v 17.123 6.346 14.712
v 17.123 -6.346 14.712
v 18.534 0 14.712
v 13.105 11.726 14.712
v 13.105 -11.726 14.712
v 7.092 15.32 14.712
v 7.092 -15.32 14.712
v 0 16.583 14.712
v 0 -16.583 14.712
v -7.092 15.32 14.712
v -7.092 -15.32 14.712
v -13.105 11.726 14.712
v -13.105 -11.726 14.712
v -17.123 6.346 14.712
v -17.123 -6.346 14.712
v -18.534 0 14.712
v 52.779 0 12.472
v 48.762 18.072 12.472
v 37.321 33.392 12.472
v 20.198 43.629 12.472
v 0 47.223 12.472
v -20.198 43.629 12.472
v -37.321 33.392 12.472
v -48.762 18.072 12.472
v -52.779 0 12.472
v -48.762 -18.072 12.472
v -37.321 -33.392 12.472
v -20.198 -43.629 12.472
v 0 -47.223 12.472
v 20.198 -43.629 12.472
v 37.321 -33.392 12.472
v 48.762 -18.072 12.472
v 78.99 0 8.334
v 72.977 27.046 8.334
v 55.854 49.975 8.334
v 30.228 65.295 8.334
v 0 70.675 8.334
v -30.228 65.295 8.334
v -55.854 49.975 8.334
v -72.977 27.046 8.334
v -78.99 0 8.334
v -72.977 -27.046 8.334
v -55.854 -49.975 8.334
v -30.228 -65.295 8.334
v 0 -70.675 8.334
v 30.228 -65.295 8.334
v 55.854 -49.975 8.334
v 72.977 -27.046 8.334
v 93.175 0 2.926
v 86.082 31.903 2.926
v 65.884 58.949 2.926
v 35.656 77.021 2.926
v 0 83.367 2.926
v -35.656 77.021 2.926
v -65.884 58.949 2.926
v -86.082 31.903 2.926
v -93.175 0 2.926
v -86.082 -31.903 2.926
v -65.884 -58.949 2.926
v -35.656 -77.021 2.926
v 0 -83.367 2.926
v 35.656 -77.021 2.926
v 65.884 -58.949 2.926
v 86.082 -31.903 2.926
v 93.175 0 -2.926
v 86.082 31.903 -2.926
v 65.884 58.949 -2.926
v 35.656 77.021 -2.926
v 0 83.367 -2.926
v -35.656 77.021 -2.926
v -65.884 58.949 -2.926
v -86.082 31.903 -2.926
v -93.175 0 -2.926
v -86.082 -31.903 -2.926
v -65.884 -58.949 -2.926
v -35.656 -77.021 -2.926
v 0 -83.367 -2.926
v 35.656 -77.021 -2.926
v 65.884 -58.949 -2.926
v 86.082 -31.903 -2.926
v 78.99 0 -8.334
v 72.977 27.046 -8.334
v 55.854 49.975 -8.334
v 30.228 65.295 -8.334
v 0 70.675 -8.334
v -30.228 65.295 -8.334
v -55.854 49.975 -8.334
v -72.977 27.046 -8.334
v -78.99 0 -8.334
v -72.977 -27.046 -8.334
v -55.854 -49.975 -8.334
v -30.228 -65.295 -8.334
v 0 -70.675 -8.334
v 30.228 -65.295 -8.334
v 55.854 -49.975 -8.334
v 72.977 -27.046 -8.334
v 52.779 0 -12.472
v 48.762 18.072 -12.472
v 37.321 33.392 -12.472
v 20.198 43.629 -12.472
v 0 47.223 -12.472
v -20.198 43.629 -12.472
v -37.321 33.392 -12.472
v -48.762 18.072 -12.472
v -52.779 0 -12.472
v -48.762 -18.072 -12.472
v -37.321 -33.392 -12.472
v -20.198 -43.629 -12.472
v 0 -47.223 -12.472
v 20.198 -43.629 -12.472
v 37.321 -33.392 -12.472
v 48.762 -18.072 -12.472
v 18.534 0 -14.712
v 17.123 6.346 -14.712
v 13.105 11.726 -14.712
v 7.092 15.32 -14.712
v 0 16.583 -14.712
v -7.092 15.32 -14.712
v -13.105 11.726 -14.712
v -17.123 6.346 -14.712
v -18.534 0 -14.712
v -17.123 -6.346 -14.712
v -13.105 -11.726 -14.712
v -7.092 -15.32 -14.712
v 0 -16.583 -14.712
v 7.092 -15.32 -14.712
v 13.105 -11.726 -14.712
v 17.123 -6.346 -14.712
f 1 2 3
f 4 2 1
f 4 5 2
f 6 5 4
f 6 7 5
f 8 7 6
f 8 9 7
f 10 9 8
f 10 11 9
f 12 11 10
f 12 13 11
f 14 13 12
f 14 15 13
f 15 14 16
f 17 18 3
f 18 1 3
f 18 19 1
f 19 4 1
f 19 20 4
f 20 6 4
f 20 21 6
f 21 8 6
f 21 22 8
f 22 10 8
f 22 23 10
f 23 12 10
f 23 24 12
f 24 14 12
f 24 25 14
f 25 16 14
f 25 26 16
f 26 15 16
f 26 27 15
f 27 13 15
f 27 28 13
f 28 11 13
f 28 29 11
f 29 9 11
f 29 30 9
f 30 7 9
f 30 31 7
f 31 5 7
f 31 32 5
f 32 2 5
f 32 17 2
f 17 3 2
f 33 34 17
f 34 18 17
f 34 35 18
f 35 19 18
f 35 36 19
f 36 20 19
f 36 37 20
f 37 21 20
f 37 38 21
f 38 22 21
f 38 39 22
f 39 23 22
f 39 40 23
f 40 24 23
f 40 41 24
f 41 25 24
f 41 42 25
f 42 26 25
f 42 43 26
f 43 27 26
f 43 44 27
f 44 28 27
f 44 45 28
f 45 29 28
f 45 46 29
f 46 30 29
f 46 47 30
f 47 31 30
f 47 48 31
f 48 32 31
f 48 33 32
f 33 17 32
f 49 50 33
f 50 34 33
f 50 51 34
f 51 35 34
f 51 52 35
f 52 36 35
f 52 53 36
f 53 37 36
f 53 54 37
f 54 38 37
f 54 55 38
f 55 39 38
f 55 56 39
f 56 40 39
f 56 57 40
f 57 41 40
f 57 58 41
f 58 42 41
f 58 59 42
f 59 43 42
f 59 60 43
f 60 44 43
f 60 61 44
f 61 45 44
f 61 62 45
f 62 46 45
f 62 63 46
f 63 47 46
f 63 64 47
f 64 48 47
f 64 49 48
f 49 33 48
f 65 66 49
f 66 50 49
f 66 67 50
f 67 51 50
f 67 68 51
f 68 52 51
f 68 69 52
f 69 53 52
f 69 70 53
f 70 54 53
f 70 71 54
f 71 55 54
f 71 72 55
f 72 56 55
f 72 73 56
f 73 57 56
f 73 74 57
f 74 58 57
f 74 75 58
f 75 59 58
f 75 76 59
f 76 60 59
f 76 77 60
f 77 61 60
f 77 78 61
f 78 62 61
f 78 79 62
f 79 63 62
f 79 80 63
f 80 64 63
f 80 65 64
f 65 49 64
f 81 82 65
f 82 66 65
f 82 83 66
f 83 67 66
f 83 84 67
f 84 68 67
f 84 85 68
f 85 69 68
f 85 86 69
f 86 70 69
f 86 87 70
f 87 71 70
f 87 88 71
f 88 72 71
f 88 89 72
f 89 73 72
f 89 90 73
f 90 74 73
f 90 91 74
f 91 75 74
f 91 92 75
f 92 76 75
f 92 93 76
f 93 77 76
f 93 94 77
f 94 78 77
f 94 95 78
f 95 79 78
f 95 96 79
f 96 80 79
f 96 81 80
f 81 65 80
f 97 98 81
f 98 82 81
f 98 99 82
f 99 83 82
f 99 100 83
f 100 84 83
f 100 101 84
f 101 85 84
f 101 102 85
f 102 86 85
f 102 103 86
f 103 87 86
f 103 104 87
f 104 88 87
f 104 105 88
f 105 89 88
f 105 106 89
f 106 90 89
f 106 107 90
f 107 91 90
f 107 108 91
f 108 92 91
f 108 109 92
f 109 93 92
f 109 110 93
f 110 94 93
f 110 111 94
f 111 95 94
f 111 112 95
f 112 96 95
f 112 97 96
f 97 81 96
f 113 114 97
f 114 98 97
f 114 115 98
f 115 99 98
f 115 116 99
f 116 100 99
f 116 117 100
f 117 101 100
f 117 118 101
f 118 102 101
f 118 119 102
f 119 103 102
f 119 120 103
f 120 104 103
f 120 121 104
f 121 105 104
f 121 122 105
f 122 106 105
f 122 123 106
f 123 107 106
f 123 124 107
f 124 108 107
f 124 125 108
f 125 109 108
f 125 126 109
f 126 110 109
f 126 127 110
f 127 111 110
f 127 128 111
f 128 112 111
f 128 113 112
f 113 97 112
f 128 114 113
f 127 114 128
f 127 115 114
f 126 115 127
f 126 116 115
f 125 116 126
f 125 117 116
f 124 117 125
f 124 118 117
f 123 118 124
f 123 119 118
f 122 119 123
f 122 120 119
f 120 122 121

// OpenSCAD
// Generated by SolidPython 1.0.1 on 2020-07-29 00:46:54


scale(v = [19, 17, 3]) {
	sphere(r = 5);
}
/***********************************************
*********      SolidPython code:      **********
************************************************
 
# import packages: SolidPython
from solid import *
from solid.utils import *
from itertools import chain, combinations, permutations


class Resize:

    def __init__(self, scad_file):
        self.scad_file = scad_file
        #self.scad_file = import_scad(scad_file)
        # cone/cylinder param:
        self.r1 = 0
        self.r2 = 0
        self.h = 0
        # rectangular prism param:
        self.w = 0
        self.l = 0
        # ellipse param:
        self.r = 0

    # import OpenScad code (file name corresponds to shape)


    # classify shape + parameters
    def assign(self, param1, param2, param3):
        if self.scad_file == 'cone.scad':
            self.r1 = param1
            self.r2 = param2
            self.h = param3
        elif self.scad_file == 'cylinder.scad':
            self.r1 = param1
            self.r2 = param2
            self.h = param3
        elif self.scad_file == 'rectangularPrism.scad':
            self.h = param1
            self.l = param2
            self.w = param3
        else:
            self.r = param1
            self.h = param2

    # resize parameters
    def iterate(self):
        x = range(3, 20, 2)
        i = 1
        if self.scad_file == 'cone.scad':
            tempList = list(permutations(x, 2))
            for temp in tempList:
                param1 = temp[0]
                param2 = temp[1]
                filepath = 'produced_scad_files/' + 'cone' + str(param1) + '_' + str(param2) + '_' + '.scad'
                scad_render_to_file(cylinder(h=param1, r1=param2, r2=0), filepath)

        elif self.scad_file == 'cylinder.scad':
            tempList = list(permutations(x, 3))
            for temp in tempList:
                param1 = temp[0]
                param2 = temp[1]
                filepath = 'produced_scad_files/' + 'cylinder' + str(param1) + '_' + str(param2) + '_' + '.scad'
                scad_render_to_file(cylinder(h=param1, r1=param2, r2=param2), filepath)

        elif self.scad_file == 'rectangularPrism.scad':
            tempList = list(permutations(x, 3))
            for temp in tempList:
                param1 = temp[0]
                param2 = temp[1]
                param3 = temp[2]
                filepath = 'produced_scad_files/' + 'rectangularPrism' + str(param1) + '_' + str(param2) + '_' + str(
                    param3) + '.scad'
                scad_render_to_file(cube(size=(param1, param2, param3)), filepath)

        elif self.scad_file == 'ellipse.scad':
            tempList = list(permutations(x, 4))
            for temp in tempList:
                param1 = temp[0]
                param2 = temp[1]
                param3 = temp[2]
                param4 = temp[3]
                filepath = 'produced_scad_files/' + 'ellipse' + str(param1) + '_' + str(param2) + '_' + str(param3) + '_' + str(param4) + '.scad'
                scad_render_to_file(scale([param1, param2, param3])(sphere(r=param4)), filepath)

    def render_to_scadfile(self):
        scad_render_to_file(scad, 'example.scad') 
 
************************************************/
